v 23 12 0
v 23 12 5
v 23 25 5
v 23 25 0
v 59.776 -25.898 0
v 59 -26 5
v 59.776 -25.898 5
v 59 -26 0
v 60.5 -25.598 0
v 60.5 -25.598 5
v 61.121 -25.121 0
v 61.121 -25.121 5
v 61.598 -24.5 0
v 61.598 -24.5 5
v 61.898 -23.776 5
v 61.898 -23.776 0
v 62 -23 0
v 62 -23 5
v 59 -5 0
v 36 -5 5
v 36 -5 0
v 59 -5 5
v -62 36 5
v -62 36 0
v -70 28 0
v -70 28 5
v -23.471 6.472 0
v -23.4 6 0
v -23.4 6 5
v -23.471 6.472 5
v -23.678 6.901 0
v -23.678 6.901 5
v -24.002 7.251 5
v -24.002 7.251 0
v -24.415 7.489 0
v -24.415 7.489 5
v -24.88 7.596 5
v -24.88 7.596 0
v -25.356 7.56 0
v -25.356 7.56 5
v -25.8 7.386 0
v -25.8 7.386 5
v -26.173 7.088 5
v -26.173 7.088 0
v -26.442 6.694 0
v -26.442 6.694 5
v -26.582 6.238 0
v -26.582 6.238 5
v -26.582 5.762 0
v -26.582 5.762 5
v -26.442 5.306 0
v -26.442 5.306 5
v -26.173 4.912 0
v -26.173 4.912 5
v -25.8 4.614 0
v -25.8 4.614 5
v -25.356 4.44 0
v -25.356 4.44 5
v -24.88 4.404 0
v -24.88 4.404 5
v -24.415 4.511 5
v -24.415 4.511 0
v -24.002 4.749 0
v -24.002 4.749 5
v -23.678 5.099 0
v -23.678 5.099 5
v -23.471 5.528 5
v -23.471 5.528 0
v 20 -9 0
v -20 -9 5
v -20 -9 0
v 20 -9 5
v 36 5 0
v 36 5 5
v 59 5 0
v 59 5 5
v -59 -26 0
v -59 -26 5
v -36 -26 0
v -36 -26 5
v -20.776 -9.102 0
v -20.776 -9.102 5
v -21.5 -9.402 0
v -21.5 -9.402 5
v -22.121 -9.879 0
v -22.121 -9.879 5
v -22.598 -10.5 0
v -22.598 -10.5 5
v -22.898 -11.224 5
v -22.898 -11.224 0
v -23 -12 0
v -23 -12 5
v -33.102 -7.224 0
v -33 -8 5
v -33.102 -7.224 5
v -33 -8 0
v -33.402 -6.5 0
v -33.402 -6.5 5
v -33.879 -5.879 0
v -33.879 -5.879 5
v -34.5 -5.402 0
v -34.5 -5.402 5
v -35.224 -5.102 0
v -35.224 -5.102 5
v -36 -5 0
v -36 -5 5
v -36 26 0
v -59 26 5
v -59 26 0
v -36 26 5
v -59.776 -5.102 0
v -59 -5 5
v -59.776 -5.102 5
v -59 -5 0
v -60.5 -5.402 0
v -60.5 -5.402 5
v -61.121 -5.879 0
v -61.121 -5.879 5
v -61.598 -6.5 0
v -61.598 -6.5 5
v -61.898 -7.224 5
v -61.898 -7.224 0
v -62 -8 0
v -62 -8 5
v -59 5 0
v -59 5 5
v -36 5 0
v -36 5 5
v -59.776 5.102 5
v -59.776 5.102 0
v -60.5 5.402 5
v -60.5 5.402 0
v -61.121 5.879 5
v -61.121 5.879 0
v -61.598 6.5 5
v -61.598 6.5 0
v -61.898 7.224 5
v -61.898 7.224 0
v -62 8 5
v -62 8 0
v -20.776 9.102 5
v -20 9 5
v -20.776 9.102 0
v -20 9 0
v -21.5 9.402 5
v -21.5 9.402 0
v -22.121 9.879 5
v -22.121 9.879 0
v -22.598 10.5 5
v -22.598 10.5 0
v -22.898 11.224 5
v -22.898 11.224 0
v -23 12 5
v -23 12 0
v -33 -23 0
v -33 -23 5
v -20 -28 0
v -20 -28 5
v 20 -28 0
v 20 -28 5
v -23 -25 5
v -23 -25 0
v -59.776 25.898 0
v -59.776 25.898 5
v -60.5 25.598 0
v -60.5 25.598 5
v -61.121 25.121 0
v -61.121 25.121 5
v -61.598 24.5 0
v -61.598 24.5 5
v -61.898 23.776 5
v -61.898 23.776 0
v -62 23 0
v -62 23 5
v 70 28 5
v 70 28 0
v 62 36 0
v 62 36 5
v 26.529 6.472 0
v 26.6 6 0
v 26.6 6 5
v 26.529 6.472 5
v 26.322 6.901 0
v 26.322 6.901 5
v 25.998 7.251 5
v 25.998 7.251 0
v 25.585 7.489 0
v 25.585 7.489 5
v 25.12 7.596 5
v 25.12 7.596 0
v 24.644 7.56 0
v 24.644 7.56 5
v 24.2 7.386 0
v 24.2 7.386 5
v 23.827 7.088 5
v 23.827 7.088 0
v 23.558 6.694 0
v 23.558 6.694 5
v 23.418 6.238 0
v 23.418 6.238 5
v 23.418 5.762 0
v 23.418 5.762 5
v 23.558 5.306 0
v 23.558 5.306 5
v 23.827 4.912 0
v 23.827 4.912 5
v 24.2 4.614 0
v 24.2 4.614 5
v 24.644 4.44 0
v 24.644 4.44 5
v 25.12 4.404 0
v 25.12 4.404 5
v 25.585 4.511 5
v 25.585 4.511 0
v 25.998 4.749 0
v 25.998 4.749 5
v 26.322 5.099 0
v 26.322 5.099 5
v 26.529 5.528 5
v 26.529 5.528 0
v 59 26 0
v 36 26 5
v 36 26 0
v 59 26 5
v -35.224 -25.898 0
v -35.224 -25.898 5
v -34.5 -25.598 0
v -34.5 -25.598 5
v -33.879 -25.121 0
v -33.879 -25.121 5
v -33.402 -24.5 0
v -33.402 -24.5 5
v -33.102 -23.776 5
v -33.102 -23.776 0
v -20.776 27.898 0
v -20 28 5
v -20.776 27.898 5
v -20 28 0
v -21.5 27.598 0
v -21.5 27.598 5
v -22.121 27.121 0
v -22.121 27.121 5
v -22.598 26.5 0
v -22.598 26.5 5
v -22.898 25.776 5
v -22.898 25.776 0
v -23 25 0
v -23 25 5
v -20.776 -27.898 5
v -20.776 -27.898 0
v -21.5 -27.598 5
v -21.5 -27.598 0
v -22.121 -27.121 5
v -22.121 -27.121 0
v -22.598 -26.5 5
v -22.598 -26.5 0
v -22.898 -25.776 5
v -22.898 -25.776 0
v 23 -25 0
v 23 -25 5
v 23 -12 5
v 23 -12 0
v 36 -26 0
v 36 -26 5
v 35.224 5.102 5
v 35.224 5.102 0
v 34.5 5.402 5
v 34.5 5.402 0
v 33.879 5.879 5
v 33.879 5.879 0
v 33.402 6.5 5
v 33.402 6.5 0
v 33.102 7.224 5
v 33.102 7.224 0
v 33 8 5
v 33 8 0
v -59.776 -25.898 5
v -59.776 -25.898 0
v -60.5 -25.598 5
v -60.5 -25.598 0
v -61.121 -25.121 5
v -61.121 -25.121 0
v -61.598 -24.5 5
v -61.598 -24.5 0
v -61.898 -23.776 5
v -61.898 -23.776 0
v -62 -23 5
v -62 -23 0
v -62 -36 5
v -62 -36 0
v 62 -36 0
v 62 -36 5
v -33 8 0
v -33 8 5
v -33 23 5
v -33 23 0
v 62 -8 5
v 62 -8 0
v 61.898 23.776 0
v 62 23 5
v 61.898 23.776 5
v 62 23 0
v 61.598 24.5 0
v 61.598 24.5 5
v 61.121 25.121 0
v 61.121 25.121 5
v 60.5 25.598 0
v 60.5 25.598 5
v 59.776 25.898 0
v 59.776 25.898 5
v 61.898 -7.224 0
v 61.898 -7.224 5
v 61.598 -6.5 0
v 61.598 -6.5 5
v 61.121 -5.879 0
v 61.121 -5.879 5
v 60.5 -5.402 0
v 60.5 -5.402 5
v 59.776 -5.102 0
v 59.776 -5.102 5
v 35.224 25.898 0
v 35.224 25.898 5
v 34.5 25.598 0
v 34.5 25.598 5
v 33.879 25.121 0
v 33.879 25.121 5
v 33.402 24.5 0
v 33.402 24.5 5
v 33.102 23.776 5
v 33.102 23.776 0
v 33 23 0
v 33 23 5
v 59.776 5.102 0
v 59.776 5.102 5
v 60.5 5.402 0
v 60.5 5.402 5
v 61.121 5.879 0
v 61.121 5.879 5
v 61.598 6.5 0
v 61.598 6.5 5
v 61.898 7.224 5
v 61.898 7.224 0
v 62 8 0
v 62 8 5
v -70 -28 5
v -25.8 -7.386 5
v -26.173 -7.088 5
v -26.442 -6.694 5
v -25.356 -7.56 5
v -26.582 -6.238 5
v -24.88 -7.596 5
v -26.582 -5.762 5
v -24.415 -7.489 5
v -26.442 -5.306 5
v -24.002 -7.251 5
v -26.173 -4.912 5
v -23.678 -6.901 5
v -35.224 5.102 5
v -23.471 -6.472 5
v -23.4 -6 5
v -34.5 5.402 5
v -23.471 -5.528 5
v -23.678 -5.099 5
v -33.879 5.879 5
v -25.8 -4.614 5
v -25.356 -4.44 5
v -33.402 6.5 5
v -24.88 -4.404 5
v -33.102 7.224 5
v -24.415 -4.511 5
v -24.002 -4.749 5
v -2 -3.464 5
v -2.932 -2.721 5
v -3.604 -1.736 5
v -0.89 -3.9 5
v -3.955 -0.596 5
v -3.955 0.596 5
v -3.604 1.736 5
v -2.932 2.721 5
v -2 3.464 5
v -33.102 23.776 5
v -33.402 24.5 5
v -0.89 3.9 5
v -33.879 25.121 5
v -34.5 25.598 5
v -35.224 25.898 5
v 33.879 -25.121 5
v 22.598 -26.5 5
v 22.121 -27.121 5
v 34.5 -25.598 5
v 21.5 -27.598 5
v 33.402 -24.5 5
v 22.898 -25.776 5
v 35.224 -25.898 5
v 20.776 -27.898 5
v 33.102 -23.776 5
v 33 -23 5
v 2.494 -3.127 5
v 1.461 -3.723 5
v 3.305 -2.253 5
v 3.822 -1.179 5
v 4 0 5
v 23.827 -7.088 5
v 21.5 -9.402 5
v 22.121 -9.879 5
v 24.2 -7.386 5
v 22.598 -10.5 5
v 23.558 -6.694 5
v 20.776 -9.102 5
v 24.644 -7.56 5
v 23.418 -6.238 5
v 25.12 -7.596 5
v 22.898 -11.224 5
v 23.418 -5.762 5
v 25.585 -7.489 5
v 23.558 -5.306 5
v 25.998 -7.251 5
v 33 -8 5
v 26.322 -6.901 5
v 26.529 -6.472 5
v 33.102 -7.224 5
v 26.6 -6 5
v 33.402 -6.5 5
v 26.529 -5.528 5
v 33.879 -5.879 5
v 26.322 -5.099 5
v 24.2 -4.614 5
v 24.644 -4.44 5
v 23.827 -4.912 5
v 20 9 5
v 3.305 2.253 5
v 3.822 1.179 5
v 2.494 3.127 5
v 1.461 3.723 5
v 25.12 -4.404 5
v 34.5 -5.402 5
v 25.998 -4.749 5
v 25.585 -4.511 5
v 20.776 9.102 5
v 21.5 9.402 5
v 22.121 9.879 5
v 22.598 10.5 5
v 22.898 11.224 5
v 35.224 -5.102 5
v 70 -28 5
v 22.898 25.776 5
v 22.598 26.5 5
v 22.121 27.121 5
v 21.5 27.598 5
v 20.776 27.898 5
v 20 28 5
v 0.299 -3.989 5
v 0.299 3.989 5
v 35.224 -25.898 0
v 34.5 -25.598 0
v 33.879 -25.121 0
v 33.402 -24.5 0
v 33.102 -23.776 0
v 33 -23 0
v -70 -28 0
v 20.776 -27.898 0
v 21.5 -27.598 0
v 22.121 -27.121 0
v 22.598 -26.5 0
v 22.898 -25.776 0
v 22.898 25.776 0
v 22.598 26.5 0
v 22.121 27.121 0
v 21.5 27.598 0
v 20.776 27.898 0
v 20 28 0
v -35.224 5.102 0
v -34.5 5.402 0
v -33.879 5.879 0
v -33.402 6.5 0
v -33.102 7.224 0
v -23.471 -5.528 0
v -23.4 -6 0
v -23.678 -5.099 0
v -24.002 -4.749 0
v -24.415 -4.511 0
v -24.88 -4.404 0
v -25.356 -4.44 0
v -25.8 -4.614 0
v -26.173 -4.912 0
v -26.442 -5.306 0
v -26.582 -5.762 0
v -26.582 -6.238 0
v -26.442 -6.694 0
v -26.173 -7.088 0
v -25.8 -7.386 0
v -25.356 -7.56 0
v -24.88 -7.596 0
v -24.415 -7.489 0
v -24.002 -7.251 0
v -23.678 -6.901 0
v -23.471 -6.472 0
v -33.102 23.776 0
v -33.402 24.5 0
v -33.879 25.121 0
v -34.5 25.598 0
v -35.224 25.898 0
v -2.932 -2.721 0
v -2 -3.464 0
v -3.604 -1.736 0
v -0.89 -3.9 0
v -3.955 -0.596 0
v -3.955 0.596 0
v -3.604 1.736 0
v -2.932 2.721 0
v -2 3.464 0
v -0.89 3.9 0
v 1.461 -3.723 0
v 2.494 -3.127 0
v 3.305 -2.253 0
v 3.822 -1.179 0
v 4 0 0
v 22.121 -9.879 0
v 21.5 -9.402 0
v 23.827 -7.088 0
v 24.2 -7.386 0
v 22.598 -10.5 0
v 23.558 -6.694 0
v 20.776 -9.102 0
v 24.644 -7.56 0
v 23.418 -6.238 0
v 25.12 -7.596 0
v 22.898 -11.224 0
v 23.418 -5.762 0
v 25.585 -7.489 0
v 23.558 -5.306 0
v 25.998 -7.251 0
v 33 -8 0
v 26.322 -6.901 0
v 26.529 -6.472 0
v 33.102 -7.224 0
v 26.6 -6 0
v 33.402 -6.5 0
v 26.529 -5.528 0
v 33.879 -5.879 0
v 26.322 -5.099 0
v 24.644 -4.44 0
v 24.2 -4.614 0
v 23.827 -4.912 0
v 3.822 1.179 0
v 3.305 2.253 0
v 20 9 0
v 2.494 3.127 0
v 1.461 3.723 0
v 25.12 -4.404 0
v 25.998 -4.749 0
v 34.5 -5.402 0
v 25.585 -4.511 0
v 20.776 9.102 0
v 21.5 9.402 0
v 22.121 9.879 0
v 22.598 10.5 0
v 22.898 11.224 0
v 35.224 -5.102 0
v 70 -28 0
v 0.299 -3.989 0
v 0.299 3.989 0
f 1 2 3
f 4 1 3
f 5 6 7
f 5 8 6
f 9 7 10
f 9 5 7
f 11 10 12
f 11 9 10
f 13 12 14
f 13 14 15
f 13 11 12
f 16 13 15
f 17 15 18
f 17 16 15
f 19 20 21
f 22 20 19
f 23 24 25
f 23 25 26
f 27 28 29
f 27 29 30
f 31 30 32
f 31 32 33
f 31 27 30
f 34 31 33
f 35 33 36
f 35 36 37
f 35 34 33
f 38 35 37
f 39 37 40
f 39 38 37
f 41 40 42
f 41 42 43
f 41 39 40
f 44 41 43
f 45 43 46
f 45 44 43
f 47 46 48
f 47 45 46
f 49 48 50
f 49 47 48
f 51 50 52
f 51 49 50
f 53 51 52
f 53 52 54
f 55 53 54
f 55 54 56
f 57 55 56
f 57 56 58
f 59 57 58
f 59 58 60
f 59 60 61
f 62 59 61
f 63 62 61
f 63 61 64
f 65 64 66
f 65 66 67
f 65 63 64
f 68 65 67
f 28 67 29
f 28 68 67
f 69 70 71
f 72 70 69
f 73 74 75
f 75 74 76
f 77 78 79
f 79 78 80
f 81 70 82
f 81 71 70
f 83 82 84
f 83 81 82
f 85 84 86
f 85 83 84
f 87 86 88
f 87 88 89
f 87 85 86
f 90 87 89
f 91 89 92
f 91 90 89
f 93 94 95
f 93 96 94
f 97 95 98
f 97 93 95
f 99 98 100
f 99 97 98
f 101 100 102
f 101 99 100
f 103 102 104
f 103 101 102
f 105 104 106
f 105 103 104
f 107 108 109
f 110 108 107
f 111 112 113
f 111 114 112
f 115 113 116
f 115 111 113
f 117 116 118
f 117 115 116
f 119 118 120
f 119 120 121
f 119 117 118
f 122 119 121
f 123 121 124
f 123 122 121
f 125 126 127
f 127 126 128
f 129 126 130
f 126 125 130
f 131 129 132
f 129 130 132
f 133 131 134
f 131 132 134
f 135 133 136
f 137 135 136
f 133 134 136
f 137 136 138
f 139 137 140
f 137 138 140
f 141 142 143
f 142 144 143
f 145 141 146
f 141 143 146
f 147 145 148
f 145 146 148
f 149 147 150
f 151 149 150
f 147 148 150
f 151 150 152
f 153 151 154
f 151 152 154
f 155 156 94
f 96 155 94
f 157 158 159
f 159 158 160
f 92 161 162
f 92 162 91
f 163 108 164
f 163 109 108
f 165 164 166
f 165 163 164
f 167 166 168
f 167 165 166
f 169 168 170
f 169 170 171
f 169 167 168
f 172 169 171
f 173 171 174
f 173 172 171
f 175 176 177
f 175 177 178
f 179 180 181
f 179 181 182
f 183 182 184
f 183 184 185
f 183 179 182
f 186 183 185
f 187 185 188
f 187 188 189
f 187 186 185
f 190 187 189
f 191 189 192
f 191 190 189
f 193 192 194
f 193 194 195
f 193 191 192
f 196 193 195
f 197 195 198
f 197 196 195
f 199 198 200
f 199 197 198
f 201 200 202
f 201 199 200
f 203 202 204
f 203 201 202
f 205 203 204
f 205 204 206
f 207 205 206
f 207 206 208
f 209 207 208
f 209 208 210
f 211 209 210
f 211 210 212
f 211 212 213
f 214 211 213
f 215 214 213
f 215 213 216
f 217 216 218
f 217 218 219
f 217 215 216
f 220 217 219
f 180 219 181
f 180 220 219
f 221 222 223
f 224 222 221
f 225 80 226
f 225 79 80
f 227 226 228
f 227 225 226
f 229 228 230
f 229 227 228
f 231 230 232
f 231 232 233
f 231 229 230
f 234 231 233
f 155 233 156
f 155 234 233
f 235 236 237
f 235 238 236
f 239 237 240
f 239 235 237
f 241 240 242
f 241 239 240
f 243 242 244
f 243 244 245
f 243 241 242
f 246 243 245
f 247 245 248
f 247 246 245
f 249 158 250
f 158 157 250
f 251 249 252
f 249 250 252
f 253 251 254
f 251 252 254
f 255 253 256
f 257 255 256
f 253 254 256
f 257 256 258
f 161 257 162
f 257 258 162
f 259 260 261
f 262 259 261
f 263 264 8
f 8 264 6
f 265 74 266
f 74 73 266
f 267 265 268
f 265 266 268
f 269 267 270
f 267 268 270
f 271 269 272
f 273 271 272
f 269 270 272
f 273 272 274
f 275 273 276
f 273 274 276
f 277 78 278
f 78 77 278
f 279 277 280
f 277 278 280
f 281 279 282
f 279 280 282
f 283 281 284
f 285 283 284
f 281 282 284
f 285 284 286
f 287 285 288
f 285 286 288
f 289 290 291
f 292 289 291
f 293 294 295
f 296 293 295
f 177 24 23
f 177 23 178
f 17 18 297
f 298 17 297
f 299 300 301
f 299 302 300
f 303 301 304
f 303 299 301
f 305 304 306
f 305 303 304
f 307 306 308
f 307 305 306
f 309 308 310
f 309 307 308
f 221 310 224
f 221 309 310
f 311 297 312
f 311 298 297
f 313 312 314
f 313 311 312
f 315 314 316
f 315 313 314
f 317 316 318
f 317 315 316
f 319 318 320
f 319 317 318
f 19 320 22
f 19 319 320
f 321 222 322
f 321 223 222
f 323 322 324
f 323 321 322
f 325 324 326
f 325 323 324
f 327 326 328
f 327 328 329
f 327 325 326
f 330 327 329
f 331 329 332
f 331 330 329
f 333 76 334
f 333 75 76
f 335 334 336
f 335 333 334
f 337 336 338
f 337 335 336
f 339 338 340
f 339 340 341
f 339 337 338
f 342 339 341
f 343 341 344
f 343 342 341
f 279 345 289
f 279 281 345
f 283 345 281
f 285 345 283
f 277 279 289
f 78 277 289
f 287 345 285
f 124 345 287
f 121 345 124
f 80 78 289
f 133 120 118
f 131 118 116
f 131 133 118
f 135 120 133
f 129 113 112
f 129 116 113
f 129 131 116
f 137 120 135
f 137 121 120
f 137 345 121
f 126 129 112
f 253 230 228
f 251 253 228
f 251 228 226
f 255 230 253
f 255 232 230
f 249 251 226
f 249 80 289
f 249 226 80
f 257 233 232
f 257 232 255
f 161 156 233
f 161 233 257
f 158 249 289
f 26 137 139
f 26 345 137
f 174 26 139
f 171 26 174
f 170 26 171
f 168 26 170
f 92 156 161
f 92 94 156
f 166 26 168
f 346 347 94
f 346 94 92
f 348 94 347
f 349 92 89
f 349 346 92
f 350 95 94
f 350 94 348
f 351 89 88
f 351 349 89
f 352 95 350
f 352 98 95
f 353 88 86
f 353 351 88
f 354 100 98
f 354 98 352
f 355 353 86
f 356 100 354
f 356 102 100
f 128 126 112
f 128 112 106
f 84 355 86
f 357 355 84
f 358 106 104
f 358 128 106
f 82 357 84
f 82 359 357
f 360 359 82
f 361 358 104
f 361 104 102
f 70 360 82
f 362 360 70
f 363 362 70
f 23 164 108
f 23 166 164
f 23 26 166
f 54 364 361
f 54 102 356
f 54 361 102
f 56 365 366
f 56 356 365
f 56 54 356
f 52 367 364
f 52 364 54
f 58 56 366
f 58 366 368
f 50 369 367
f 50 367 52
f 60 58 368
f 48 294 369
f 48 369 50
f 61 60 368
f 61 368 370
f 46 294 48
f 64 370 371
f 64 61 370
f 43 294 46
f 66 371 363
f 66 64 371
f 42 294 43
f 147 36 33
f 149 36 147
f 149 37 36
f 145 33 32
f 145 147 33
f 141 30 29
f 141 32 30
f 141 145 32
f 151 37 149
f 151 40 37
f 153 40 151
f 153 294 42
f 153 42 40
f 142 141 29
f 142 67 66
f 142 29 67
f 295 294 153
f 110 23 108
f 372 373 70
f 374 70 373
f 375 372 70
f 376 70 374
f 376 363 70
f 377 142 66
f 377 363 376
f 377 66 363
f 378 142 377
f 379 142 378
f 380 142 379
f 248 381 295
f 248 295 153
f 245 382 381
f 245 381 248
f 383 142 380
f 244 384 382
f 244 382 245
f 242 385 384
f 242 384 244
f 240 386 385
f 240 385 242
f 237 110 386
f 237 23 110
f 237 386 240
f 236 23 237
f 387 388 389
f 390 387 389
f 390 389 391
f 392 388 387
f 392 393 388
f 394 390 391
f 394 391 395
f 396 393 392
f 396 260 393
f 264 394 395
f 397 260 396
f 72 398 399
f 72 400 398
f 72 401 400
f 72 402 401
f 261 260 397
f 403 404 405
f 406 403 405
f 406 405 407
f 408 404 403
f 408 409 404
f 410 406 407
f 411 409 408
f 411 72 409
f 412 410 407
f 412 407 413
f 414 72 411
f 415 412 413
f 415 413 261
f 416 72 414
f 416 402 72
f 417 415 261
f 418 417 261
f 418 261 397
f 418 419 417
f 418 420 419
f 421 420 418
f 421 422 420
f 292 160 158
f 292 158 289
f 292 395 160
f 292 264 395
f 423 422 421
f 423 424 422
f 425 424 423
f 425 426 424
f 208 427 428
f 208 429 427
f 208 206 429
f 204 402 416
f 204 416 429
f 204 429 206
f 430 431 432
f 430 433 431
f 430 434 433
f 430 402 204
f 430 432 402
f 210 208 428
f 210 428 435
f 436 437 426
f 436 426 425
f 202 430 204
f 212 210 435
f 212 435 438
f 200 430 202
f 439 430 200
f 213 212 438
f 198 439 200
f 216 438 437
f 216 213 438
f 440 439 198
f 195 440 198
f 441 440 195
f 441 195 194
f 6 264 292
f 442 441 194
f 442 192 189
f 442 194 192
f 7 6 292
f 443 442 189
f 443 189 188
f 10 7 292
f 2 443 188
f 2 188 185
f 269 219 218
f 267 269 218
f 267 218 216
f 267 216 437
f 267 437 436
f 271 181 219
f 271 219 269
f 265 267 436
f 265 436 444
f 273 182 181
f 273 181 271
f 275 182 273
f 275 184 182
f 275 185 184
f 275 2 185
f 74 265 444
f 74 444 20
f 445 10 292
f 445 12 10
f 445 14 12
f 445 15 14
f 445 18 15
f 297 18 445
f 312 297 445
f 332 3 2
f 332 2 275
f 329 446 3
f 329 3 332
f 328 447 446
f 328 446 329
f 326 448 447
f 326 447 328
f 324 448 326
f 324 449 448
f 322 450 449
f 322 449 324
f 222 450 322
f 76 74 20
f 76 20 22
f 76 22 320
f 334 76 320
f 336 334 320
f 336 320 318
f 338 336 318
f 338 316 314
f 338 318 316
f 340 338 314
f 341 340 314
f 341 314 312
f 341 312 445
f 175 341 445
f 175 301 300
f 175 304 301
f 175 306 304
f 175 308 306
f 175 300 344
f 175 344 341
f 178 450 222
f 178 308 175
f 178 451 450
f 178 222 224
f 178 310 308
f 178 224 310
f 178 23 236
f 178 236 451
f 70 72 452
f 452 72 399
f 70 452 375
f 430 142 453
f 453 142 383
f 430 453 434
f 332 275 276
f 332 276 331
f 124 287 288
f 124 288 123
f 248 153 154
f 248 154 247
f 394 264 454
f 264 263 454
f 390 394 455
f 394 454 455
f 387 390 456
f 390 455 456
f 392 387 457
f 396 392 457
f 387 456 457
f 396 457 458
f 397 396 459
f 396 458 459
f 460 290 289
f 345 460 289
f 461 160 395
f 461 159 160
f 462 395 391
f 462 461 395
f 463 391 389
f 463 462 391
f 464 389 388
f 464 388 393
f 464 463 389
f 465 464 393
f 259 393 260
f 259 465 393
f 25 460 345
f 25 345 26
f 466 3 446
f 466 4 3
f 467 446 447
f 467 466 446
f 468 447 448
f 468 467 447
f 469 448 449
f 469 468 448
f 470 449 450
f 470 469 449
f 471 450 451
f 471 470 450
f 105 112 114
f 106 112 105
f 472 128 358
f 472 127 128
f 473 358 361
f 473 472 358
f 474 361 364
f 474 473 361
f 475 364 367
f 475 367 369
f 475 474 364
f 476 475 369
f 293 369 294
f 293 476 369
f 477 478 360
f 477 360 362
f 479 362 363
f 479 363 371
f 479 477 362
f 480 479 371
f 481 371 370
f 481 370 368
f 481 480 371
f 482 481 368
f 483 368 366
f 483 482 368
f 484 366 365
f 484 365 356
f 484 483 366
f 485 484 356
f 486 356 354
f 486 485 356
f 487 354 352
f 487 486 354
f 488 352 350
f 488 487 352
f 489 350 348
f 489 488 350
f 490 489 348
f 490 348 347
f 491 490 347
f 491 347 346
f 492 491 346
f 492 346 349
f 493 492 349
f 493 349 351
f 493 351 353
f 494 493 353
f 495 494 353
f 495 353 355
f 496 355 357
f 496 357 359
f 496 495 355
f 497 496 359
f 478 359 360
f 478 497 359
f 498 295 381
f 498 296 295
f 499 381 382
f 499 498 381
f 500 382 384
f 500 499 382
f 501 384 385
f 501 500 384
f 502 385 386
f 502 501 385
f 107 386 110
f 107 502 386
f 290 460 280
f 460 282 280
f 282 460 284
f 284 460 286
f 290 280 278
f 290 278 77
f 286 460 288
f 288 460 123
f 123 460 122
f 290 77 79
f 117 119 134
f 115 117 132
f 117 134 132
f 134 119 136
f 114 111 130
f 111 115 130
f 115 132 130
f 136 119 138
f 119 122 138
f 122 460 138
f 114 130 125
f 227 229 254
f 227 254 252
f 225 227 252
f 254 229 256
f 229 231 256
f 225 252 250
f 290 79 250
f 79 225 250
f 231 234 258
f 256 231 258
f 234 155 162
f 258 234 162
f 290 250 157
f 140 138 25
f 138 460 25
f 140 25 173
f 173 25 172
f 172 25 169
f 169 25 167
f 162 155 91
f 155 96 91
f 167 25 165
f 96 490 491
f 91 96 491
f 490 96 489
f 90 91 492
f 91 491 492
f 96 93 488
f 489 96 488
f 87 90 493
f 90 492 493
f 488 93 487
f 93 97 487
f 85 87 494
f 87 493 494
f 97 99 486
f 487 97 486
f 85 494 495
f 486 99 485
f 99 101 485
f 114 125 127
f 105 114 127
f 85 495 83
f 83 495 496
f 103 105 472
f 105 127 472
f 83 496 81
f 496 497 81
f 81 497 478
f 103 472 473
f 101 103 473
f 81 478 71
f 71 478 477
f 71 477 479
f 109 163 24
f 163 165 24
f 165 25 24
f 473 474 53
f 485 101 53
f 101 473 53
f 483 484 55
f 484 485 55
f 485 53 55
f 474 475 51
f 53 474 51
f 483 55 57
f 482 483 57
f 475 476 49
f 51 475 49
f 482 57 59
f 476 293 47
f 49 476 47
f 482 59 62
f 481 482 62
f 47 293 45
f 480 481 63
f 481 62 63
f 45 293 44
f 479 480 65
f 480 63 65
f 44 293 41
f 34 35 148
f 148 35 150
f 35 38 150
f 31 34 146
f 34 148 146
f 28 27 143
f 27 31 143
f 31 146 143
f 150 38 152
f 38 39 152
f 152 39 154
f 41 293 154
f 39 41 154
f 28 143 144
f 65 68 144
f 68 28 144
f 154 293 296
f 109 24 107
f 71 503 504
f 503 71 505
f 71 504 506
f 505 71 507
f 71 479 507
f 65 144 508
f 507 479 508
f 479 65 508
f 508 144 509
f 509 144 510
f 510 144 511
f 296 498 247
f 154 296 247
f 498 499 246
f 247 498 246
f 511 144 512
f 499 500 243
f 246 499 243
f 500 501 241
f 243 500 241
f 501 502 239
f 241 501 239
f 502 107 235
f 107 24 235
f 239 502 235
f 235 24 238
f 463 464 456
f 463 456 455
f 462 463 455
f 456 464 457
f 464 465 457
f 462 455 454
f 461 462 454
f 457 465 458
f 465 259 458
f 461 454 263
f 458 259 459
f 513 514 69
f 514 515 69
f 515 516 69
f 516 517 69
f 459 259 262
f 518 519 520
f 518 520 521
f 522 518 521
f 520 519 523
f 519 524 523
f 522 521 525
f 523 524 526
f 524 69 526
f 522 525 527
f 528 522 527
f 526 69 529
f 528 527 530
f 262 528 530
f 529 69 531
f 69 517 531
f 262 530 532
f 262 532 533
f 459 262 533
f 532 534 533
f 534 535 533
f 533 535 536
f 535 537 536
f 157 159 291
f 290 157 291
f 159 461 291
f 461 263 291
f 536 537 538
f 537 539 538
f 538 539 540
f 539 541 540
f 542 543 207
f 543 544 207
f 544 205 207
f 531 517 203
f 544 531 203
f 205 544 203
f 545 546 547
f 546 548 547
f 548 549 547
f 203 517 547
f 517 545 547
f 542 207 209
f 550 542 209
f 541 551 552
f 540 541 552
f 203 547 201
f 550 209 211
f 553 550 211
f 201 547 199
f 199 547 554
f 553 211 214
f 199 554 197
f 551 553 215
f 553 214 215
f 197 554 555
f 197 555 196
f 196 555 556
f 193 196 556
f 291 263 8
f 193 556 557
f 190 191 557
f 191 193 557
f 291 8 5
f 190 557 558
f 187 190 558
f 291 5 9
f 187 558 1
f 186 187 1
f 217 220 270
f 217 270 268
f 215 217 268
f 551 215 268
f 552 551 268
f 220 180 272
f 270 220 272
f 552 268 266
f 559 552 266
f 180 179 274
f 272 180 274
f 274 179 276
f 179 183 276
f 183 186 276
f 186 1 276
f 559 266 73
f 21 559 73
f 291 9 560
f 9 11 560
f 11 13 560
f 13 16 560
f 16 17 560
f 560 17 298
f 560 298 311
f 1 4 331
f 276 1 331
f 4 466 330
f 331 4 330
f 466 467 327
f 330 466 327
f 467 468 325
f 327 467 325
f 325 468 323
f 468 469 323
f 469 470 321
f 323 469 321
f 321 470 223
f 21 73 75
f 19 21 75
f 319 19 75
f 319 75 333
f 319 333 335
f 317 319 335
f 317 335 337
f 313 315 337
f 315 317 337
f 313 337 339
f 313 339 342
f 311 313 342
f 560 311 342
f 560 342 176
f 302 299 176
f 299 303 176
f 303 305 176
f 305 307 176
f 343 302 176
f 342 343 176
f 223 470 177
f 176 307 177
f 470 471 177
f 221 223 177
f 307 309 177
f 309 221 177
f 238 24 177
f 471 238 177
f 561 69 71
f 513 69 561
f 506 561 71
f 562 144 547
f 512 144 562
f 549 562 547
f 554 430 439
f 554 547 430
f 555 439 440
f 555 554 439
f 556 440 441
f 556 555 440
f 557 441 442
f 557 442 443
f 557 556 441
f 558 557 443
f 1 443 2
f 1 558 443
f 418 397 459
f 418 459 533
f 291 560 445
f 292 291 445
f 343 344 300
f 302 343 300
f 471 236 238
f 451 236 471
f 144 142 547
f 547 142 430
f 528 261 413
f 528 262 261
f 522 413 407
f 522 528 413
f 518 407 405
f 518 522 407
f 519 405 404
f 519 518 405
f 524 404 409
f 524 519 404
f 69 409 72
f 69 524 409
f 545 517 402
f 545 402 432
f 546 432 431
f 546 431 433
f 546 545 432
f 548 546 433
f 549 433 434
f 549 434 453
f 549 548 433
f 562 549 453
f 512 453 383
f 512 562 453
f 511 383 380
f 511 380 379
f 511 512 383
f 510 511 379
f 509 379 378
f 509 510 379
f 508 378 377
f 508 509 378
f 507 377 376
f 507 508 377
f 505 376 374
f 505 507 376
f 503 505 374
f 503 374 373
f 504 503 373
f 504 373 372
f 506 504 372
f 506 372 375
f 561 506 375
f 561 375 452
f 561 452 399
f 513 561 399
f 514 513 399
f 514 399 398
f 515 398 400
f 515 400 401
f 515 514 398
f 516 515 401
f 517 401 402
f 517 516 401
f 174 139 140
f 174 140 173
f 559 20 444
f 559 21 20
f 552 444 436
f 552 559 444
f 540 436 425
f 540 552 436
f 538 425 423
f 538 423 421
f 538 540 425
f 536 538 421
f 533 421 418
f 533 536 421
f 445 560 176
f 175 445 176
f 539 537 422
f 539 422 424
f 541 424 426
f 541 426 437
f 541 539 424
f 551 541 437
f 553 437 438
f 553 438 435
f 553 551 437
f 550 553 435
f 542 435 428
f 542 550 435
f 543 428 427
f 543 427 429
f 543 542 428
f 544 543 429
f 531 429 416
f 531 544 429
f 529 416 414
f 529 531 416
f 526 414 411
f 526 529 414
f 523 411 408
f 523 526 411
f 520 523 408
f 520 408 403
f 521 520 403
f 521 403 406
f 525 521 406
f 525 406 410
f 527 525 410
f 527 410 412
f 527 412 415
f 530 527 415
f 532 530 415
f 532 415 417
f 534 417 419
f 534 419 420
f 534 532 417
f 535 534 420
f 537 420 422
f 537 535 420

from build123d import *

# Parameters (mm, degrees)
SKETCH_1_W          = 140
SKETCH_1_H          = 72
SKETCH_1_R          = 1.6
SKETCH_1_R_2        = 4
EXTRUDE_1_DEPTH     = 5
SKETCH_2_W          = 29
SKETCH_2_H          = 21
SKETCH_2_W_2        = 46
SKETCH_2_H_2        = 19
CUT_EXTRUDE_1_DEPTH = 79.873316147
FILLET_1_R          = 3
CHAMFER_1_SIZE      = 8


with BuildPart() as part:
    # 草图1 → 凸台-拉伸1 (new body)
    with BuildSketch(Plane.XY):
        Rectangle(SKETCH_1_W, SKETCH_1_H)
        with Locations((-25, 6)):
            Circle(SKETCH_1_R, mode=Mode.SUBTRACT)
        with Locations((25, 6)):
            Circle(SKETCH_1_R, mode=Mode.SUBTRACT)
        with Locations((-25, -6)):
            Circle(SKETCH_1_R, mode=Mode.SUBTRACT)
        with Locations((25, -6)):
            Circle(SKETCH_1_R, mode=Mode.SUBTRACT)
        Circle(SKETCH_1_R_2, mode=Mode.SUBTRACT)
    extrude(amount=EXTRUDE_1_DEPTH)

    # 草图2 → 切除-拉伸1 (cut, through all)
    with BuildSketch(Plane.XY.offset(5)):
        with Locations((-47.5, 15.5)):
            Rectangle(SKETCH_2_W, SKETCH_2_H)
        with Locations((-47.5, -15.5)):
            Rectangle(SKETCH_2_W, SKETCH_2_H)
        with Locations((47.5, -15.5)):
            Rectangle(SKETCH_2_W, SKETCH_2_H)
        with Locations((47.5, 15.5)):
            Rectangle(SKETCH_2_W, SKETCH_2_H)
        with Locations((0, 18.5)):
            Rectangle(SKETCH_2_W_2, SKETCH_2_H_2)
        with Locations((0, -18.5)):
            Rectangle(SKETCH_2_W_2, SKETCH_2_H_2)
    extrude(amount=-CUT_EXTRUDE_1_DEPTH, mode=Mode.SUBTRACT)

    # 圆角1
    fillet_1_edges = [part.edges().sort_by_distance(p)[0] for p in [
        (-62, -26, 2.5),
        (-62, -5, 2.5),
        (-33, -5, 2.5),
        (-33, -26, 2.5),
        (23, 28, 2.5),
        (23, 9, 2.5),
        (-23, 9, 2.5),
        (-23, 28, 2.5),
        (62, -5, 2.5),
        (62, -26, 2.5),
        (33, -26, 2.5),
        (33, -5, 2.5),
        (62, 26, 2.5),
        (62, 5, 2.5),
        (33, 5, 2.5),
        (33, 26, 2.5),
        (23, -9, 2.5),
        (23, -28, 2.5),
        (-23, -28, 2.5),
        (-23, -9, 2.5),
        (-62, 5, 2.5),
        (-62, 26, 2.5),
        (-33, 26, 2.5),
        (-33, 5, 2.5),
    ]]
    fillet(fillet_1_edges, radius=FILLET_1_R)

    # 倒角1
    chamfer_1_edges = [part.edges().sort_by_distance(p)[0] for p in [
        (-70, 36, 2.5),
        (70, 36, 2.5),
        (70, -36, 2.5),
        (-70, -36, 2.5),
    ]]
    chamfer(chamfer_1_edges, length=CHAMFER_1_SIZE)


solid = part.part
